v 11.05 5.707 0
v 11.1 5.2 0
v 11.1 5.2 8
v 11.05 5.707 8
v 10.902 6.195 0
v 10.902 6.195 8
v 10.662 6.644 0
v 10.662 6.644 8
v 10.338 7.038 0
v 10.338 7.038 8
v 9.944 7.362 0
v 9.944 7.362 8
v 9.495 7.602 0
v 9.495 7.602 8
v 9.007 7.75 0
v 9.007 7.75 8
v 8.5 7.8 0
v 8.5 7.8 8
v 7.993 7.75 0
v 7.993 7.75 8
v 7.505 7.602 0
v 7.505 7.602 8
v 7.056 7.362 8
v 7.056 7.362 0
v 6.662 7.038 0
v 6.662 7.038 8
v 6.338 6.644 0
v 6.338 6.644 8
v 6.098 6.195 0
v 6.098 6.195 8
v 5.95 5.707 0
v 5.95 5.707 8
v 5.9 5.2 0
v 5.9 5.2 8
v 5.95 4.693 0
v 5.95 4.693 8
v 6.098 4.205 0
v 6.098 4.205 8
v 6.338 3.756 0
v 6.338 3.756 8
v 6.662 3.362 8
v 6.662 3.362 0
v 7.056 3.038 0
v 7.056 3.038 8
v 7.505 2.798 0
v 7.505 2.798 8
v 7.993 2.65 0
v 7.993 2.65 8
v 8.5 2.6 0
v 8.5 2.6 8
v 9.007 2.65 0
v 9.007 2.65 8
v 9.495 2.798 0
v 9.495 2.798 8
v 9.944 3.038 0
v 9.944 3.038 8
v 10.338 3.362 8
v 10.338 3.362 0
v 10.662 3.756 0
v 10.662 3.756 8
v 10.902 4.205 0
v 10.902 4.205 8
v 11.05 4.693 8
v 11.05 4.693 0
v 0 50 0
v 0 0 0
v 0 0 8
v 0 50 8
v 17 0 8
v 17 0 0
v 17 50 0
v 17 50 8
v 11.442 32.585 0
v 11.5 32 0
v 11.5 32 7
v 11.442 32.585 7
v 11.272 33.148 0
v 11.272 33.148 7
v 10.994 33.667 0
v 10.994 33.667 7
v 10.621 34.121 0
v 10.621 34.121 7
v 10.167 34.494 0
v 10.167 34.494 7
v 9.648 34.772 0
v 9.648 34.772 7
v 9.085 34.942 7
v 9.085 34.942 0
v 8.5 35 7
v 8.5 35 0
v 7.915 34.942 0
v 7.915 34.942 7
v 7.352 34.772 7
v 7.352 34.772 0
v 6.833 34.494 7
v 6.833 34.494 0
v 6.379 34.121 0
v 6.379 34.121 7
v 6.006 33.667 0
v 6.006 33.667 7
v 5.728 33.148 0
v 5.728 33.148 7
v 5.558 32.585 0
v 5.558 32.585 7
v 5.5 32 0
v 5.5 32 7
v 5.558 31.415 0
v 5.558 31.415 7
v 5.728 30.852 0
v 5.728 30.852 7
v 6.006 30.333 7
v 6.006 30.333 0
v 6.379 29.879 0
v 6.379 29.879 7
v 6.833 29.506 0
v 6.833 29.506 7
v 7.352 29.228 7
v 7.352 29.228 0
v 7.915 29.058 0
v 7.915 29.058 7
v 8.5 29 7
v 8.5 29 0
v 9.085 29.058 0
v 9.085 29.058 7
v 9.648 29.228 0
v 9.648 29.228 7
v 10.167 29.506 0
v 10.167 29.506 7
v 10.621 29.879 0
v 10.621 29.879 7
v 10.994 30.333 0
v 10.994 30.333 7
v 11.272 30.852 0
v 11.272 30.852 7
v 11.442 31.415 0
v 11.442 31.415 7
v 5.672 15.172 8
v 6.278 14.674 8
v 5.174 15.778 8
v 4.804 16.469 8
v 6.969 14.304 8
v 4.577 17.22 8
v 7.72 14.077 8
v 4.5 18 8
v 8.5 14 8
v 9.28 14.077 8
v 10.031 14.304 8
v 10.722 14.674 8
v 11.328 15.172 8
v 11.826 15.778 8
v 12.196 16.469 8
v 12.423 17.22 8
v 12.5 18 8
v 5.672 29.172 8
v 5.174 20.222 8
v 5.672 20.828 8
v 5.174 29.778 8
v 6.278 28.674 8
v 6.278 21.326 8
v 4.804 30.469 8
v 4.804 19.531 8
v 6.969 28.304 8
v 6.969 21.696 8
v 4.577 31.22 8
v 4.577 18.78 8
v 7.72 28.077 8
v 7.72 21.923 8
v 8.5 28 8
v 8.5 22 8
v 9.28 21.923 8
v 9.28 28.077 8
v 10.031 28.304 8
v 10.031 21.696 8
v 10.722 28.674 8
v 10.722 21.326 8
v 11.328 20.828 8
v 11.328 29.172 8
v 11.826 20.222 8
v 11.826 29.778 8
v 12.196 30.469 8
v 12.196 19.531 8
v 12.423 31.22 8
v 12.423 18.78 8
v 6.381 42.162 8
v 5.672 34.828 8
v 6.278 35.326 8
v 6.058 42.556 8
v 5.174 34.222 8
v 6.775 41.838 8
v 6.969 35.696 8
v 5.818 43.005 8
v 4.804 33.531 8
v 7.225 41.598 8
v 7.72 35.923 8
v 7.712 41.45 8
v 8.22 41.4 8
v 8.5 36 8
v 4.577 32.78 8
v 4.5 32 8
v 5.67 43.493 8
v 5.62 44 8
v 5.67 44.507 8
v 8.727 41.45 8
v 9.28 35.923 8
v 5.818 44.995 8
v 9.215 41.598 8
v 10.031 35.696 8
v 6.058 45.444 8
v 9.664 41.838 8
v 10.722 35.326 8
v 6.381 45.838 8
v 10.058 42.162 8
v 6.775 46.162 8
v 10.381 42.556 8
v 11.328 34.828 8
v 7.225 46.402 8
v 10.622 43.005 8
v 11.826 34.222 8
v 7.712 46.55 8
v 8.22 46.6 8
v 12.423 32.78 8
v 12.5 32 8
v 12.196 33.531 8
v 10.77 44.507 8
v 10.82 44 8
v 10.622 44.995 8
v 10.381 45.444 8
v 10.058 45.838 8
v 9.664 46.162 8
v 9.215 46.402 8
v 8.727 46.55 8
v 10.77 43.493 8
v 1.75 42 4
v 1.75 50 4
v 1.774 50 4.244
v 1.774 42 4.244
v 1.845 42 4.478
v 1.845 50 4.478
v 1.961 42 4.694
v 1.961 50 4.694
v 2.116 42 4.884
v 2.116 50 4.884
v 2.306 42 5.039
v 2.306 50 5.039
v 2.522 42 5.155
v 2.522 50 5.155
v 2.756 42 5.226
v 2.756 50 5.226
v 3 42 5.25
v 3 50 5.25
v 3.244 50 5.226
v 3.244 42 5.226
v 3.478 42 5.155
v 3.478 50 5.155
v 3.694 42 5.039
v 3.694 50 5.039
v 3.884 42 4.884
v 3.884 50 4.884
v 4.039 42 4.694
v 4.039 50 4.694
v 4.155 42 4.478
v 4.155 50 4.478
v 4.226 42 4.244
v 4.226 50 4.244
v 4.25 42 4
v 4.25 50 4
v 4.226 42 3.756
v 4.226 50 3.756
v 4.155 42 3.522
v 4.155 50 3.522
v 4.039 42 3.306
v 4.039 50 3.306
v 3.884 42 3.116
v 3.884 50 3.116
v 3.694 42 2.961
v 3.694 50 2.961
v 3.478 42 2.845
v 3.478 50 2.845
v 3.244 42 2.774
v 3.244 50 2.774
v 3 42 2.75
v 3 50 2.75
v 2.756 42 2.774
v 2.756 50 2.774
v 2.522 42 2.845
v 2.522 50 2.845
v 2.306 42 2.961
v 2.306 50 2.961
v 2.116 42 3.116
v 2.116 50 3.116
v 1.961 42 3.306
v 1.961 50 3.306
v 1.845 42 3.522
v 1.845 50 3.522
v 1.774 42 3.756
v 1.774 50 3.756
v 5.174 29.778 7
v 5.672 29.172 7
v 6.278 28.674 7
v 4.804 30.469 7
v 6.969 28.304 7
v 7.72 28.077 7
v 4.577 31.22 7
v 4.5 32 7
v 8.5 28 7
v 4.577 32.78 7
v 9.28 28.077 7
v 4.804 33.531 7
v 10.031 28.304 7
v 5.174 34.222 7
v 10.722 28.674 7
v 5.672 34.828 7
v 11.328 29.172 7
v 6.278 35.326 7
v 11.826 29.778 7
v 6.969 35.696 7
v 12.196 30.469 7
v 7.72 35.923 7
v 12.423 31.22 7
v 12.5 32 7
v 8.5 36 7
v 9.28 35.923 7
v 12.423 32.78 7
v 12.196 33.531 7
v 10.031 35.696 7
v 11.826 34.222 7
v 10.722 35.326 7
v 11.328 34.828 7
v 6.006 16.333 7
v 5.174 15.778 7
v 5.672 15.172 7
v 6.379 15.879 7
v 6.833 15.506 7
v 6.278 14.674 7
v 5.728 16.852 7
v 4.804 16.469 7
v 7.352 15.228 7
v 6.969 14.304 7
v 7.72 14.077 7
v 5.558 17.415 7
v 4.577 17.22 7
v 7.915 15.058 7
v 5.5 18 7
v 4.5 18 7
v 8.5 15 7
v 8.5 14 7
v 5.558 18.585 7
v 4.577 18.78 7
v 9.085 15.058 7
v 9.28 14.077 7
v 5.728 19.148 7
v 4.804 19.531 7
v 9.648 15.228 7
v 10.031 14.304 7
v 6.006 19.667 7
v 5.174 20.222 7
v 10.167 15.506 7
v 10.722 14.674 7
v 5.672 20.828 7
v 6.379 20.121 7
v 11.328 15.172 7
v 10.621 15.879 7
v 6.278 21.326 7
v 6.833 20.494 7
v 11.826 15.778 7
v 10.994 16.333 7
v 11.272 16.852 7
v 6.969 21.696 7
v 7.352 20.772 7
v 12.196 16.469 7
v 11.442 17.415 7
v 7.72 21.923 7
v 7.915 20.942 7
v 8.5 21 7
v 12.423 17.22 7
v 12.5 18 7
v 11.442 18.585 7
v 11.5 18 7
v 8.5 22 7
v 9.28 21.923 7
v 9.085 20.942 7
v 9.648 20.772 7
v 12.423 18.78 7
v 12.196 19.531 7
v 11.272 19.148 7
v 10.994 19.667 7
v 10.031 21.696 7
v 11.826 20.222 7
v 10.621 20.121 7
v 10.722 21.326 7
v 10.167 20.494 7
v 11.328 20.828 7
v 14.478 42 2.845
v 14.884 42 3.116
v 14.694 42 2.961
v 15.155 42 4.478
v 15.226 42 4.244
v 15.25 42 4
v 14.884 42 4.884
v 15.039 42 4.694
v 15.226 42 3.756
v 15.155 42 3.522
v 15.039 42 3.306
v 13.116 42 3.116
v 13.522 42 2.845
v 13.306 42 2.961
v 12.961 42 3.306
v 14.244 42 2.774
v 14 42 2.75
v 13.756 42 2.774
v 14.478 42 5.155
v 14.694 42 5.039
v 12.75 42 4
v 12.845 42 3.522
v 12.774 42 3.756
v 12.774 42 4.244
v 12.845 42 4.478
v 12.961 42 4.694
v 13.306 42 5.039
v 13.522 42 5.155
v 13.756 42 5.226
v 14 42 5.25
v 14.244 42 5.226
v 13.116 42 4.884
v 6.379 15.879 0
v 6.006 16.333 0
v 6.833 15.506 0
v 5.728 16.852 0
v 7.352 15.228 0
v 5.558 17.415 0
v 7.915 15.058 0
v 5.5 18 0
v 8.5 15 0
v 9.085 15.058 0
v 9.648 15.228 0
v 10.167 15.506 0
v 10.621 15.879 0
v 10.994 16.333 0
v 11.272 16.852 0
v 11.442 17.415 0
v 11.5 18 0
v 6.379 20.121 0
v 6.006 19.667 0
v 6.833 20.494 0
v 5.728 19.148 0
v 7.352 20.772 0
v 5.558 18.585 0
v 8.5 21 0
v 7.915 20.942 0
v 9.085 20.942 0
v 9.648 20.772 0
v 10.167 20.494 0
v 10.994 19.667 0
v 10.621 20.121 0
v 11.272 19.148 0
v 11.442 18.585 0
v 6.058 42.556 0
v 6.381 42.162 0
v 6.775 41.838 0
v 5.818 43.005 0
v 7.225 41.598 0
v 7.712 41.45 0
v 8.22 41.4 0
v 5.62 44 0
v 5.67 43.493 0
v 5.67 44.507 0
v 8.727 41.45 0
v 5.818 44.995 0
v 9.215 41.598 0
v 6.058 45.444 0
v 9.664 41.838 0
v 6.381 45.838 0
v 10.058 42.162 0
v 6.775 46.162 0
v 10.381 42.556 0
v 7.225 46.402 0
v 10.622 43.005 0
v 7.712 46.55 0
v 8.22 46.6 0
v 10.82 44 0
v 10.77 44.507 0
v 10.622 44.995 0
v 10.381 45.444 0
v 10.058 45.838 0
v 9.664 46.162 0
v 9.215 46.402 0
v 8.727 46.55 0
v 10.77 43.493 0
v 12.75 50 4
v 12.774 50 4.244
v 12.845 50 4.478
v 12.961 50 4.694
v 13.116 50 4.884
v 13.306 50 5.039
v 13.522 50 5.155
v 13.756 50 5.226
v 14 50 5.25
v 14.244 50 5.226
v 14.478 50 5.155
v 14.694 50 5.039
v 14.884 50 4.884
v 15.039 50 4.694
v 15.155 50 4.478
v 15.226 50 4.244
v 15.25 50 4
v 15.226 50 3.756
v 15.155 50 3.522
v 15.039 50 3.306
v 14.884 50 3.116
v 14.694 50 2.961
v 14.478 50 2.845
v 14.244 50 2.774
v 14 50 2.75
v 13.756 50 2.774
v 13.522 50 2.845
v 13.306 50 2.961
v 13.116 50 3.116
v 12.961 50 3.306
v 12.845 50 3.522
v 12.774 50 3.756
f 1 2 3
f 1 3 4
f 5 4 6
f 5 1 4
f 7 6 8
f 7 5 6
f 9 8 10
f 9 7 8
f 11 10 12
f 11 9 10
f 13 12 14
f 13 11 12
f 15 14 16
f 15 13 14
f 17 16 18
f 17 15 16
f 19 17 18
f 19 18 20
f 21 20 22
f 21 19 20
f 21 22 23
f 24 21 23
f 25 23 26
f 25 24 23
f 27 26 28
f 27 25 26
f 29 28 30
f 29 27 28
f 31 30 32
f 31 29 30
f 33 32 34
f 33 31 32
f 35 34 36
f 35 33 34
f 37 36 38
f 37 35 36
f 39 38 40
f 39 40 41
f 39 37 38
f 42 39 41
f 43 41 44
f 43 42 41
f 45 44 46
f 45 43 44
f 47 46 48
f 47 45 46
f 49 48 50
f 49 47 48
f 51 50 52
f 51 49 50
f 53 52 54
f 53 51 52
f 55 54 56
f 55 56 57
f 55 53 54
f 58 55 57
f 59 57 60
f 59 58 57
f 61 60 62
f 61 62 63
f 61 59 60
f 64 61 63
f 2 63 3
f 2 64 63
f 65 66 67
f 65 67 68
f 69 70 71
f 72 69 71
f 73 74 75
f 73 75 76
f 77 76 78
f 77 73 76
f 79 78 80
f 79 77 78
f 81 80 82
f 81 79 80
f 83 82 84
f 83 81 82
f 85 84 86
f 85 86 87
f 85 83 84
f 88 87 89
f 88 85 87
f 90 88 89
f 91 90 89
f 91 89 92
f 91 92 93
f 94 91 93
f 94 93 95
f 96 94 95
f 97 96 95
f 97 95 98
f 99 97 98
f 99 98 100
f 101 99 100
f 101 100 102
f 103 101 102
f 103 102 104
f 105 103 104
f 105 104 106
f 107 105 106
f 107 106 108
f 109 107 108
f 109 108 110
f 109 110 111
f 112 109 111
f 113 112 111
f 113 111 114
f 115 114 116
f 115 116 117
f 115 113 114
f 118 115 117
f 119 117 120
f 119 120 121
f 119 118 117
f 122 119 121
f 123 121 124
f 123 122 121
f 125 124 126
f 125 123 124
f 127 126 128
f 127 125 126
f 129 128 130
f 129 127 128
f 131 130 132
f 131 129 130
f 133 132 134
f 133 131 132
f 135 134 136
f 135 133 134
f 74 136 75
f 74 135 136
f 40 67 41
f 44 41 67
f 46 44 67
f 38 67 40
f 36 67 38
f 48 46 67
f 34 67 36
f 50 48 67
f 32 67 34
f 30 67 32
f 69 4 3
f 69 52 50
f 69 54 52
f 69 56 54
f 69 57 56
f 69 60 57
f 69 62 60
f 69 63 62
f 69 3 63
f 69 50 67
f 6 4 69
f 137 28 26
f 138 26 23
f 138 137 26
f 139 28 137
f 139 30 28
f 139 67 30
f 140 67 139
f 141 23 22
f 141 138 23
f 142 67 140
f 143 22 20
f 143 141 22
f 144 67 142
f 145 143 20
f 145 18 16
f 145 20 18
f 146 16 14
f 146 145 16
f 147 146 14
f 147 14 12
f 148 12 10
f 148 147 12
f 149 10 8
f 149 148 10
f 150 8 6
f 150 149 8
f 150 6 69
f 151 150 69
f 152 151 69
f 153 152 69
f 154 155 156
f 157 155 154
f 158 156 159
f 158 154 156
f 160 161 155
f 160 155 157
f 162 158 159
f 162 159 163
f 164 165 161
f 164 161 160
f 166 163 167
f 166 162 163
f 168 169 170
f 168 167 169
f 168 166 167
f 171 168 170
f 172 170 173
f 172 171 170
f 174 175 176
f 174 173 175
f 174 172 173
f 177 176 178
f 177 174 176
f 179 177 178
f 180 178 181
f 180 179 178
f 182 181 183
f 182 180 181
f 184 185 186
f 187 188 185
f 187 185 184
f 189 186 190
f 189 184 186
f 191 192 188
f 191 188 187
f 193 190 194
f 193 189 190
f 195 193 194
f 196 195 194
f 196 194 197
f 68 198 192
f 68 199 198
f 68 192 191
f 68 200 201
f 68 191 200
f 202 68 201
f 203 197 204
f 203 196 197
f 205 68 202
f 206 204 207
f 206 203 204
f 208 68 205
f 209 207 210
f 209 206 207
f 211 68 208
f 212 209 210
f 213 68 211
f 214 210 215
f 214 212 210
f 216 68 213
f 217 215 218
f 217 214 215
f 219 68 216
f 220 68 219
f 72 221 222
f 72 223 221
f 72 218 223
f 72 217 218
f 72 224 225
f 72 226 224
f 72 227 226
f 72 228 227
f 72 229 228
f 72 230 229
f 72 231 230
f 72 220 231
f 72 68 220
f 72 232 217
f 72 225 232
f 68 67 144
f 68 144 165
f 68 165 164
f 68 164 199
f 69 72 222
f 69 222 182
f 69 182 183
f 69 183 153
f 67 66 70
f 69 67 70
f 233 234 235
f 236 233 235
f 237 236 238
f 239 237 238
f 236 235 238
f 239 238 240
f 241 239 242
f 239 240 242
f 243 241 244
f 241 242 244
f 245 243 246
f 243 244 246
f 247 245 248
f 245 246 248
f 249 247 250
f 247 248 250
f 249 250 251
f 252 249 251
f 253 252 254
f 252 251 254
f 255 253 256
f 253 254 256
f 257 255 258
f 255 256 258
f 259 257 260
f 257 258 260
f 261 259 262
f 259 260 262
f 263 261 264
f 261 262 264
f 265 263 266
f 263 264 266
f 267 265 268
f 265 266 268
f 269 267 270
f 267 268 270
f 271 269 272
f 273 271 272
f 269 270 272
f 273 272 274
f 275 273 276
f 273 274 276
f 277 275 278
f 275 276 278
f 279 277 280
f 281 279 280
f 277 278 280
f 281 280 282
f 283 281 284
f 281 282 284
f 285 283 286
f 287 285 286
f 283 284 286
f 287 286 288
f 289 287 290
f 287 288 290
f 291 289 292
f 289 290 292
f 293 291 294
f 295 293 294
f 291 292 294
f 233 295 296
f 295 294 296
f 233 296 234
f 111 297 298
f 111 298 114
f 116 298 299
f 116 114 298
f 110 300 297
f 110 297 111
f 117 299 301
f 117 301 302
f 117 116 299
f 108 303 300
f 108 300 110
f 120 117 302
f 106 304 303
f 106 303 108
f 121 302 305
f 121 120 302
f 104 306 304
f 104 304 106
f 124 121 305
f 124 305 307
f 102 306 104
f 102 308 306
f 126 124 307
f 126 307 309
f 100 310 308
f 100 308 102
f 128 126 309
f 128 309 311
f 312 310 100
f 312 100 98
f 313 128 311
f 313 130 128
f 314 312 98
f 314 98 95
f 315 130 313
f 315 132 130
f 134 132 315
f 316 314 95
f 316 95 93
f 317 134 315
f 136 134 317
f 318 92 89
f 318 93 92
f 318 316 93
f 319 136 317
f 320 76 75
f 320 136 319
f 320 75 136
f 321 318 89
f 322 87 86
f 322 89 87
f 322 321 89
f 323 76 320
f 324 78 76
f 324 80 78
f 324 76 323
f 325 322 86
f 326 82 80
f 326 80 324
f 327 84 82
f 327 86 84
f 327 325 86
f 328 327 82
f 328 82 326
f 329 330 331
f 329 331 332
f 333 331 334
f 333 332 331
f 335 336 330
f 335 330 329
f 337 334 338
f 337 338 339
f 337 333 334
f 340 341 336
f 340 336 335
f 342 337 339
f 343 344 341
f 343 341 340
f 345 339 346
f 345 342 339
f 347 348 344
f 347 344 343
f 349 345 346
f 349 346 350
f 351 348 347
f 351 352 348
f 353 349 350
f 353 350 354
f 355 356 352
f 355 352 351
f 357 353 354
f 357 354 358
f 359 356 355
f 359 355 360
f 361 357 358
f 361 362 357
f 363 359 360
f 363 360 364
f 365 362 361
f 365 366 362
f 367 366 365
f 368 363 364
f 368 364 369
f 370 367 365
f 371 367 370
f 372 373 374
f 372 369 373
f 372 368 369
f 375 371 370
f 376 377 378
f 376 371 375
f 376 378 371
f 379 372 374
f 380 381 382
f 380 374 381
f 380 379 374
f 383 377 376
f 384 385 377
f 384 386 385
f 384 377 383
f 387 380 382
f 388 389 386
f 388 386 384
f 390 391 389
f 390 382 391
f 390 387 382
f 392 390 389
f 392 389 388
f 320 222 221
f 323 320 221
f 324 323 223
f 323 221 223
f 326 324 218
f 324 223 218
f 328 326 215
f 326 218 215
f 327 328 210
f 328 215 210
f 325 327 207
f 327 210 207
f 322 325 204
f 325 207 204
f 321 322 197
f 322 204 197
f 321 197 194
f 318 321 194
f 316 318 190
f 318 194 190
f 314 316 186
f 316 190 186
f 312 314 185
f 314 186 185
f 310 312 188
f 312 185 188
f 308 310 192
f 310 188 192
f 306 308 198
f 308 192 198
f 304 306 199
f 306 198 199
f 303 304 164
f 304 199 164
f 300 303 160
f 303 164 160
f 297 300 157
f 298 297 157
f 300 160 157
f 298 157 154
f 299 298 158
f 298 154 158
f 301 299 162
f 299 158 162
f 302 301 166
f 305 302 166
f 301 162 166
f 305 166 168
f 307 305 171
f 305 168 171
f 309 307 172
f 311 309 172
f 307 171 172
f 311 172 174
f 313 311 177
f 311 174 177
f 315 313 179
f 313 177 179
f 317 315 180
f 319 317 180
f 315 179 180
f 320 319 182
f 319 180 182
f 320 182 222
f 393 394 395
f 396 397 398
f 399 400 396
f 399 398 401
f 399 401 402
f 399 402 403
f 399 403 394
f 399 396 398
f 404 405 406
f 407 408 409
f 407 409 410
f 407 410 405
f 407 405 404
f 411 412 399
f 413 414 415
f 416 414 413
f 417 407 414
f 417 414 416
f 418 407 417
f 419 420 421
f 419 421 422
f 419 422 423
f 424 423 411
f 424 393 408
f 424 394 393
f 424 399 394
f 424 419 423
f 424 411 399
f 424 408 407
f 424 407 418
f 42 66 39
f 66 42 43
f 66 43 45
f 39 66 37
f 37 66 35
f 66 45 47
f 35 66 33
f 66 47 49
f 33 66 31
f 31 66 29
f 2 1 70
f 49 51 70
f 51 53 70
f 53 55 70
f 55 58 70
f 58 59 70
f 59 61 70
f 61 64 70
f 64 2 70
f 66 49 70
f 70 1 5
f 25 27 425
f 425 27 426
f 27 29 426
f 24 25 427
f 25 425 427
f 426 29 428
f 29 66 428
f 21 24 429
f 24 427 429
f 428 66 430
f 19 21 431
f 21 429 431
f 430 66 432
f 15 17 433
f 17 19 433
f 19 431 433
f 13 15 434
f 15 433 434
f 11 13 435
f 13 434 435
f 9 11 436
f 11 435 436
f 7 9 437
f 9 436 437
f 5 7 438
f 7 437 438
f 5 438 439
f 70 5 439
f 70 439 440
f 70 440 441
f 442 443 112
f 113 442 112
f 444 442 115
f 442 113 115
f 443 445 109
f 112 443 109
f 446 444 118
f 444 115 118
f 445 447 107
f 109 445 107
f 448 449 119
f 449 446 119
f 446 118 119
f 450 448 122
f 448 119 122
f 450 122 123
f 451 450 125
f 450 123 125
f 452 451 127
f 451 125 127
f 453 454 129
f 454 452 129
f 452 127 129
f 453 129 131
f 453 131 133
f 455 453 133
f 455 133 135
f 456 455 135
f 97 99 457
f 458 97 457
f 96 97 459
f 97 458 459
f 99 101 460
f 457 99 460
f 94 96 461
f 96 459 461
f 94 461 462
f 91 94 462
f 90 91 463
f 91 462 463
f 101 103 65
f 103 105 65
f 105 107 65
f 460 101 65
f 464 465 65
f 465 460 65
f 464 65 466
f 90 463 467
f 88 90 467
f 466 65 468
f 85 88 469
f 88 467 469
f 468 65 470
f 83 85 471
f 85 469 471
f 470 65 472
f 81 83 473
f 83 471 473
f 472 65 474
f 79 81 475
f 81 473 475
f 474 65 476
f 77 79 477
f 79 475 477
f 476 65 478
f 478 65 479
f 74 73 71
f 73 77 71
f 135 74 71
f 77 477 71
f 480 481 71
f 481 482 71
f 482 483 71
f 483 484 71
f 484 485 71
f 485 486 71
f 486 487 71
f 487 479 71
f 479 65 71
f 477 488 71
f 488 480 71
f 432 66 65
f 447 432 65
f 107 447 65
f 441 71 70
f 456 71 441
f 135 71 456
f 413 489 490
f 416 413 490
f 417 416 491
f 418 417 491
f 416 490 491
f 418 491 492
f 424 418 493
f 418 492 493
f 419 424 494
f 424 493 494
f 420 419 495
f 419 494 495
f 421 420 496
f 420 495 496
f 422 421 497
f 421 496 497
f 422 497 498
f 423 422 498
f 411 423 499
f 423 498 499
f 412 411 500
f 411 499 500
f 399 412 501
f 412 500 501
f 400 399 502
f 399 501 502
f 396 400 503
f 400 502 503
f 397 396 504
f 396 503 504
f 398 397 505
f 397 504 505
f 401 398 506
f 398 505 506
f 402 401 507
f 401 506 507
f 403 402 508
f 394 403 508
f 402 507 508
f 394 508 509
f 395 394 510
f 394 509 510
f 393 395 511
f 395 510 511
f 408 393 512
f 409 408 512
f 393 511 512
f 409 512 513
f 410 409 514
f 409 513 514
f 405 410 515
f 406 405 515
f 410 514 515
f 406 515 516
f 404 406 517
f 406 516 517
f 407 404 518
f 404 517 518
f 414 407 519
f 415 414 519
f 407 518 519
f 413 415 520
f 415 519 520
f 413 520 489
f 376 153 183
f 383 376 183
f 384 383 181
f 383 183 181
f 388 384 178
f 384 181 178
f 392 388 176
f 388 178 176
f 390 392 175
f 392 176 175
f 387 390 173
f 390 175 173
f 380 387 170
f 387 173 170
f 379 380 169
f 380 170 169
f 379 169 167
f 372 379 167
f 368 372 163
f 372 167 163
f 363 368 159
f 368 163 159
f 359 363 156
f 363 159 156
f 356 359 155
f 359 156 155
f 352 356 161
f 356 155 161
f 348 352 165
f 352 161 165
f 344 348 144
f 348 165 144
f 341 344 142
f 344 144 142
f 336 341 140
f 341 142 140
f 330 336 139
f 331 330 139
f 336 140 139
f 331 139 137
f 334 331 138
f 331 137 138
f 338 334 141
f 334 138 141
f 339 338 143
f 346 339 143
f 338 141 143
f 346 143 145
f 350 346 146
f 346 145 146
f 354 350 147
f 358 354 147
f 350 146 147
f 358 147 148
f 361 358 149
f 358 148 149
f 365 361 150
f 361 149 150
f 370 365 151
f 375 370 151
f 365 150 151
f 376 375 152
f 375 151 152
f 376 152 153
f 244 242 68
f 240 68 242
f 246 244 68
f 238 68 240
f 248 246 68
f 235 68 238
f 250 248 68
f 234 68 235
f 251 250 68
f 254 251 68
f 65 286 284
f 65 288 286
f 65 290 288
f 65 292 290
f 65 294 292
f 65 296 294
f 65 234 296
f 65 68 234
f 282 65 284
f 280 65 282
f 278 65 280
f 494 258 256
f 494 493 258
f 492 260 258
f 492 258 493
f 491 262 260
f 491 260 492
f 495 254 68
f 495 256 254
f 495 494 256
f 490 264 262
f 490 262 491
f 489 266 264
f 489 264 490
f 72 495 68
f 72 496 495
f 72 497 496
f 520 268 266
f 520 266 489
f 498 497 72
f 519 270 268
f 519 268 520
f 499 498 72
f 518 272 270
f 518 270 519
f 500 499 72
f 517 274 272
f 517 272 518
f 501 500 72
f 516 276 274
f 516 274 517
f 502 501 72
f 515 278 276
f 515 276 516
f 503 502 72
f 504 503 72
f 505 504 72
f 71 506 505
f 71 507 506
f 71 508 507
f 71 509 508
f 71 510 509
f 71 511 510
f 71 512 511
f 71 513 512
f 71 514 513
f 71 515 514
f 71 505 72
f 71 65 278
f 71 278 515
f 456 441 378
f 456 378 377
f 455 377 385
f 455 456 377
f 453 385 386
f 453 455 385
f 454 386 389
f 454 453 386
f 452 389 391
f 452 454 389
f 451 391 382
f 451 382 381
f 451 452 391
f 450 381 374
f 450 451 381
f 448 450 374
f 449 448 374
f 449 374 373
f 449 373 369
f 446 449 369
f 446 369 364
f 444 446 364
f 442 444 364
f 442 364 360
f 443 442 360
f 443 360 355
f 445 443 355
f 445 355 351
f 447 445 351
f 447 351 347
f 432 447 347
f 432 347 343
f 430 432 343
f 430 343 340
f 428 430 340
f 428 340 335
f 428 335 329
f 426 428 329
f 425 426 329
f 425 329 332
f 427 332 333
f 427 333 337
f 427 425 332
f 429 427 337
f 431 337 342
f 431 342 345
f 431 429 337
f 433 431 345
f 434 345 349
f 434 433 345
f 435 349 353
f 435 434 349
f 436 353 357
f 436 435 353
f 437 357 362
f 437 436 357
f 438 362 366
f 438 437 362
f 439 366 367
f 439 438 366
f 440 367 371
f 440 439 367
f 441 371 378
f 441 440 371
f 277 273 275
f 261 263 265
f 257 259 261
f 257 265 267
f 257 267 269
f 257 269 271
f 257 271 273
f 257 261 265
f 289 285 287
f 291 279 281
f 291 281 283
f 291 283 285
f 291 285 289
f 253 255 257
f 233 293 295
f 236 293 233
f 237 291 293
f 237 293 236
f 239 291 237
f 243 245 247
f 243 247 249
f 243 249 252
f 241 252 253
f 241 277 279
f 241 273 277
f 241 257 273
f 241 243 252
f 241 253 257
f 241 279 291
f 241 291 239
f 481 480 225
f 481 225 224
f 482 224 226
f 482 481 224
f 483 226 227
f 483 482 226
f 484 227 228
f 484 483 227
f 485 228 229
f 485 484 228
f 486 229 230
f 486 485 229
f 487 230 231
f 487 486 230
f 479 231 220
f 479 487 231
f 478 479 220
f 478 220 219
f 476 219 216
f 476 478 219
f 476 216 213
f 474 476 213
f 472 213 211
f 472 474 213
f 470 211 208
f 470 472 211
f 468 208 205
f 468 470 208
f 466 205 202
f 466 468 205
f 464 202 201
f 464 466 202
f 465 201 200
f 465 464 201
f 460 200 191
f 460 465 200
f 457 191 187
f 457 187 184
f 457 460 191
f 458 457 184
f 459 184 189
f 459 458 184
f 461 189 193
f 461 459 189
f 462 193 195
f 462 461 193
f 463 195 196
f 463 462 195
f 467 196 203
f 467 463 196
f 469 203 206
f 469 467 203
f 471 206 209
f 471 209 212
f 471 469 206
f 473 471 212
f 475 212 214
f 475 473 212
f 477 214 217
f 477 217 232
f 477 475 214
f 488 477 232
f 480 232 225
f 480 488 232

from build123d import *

# Parameters (mm, degrees)
F0_W     = 17
F0_H     = 50
F0_R     = 2.6
F0_R_2   = 3
F1_DEPTH = 8
F2_R     = 4
F2_R_2   = 3
F3_DEPTH = 1
F4_R     = 1.25
F5_DEPTH = 8


with BuildPart() as f1:
    # F0 (on Top) → F1 (new body)
    with BuildSketch(Plane.XY):
        with Locations((8.5, 25)):
            Rectangle(F0_W, F0_H)
        with Locations((8.5, 5.2)):
            Circle(F0_R, mode=Mode.SUBTRACT)
        with Locations((8.5, 18)):
            Circle(F0_R_2, mode=Mode.SUBTRACT)
        with Locations((8.219655, 44)):
            Circle(F0_R, mode=Mode.SUBTRACT)
        with Locations((8.5, 32)):
            Circle(F0_R_2, mode=Mode.SUBTRACT)
    extrude(amount=F1_DEPTH)

    # F2 (on face) → F3 (cut)
    with BuildSketch(Plane.XY.offset(8)):
        with Locations((8.5, 32)):
            Circle(F2_R)
        with Locations((8.5, 32)):
            Circle(F2_R_2, mode=Mode.SUBTRACT)
        with Locations((8.5, 18)):
            Circle(F2_R)
        with Locations((8.5, 18)):
            Circle(F2_R_2, mode=Mode.SUBTRACT)
    extrude(amount=-F3_DEPTH, mode=Mode.SUBTRACT)

    # F4 (on face) → F5 (cut)
    with BuildSketch(Plane(origin=(0, 50, 0), x_dir=(-1, 0, 0), z_dir=(0, 1, 0))):
        with Locations((-14, 4)):
            Circle(F4_R)
        with Locations((-3, 4)):
            Circle(F4_R)
    extrude(amount=-F5_DEPTH, mode=Mode.SUBTRACT)


solid = f1.part
